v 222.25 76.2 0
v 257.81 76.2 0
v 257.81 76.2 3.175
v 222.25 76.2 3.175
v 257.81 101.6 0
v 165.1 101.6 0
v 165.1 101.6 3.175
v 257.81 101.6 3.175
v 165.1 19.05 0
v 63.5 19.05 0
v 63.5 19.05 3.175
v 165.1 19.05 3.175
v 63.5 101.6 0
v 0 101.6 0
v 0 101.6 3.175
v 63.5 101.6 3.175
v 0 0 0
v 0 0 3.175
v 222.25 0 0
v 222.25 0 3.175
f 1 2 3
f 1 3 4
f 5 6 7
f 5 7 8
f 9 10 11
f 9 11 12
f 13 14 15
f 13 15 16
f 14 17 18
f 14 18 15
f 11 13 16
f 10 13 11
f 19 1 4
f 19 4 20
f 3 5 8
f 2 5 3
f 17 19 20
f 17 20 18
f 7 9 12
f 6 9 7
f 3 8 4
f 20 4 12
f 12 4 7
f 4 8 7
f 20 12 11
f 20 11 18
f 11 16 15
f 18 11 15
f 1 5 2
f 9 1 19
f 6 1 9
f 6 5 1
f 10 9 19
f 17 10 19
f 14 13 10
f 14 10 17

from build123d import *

# Parameters (mm, degrees)
BOSS_EXTRUDE1_DEPTH = 3.175


with BuildPart() as part:
    # Sketch1 → Boss-Extrude1 (new body)
    with BuildSketch(Plane.XY):
        Polygon((257.81, 76.2), (222.25, 76.2), (222.25, 0), (0, 0), (0, 101.6), (63.5, 101.6), (63.5, 19.05), (165.1, 19.05), (165.1, 101.6), (257.81, 101.6), align=None)
    extrude(amount=BOSS_EXTRUDE1_DEPTH)


solid = part.part
